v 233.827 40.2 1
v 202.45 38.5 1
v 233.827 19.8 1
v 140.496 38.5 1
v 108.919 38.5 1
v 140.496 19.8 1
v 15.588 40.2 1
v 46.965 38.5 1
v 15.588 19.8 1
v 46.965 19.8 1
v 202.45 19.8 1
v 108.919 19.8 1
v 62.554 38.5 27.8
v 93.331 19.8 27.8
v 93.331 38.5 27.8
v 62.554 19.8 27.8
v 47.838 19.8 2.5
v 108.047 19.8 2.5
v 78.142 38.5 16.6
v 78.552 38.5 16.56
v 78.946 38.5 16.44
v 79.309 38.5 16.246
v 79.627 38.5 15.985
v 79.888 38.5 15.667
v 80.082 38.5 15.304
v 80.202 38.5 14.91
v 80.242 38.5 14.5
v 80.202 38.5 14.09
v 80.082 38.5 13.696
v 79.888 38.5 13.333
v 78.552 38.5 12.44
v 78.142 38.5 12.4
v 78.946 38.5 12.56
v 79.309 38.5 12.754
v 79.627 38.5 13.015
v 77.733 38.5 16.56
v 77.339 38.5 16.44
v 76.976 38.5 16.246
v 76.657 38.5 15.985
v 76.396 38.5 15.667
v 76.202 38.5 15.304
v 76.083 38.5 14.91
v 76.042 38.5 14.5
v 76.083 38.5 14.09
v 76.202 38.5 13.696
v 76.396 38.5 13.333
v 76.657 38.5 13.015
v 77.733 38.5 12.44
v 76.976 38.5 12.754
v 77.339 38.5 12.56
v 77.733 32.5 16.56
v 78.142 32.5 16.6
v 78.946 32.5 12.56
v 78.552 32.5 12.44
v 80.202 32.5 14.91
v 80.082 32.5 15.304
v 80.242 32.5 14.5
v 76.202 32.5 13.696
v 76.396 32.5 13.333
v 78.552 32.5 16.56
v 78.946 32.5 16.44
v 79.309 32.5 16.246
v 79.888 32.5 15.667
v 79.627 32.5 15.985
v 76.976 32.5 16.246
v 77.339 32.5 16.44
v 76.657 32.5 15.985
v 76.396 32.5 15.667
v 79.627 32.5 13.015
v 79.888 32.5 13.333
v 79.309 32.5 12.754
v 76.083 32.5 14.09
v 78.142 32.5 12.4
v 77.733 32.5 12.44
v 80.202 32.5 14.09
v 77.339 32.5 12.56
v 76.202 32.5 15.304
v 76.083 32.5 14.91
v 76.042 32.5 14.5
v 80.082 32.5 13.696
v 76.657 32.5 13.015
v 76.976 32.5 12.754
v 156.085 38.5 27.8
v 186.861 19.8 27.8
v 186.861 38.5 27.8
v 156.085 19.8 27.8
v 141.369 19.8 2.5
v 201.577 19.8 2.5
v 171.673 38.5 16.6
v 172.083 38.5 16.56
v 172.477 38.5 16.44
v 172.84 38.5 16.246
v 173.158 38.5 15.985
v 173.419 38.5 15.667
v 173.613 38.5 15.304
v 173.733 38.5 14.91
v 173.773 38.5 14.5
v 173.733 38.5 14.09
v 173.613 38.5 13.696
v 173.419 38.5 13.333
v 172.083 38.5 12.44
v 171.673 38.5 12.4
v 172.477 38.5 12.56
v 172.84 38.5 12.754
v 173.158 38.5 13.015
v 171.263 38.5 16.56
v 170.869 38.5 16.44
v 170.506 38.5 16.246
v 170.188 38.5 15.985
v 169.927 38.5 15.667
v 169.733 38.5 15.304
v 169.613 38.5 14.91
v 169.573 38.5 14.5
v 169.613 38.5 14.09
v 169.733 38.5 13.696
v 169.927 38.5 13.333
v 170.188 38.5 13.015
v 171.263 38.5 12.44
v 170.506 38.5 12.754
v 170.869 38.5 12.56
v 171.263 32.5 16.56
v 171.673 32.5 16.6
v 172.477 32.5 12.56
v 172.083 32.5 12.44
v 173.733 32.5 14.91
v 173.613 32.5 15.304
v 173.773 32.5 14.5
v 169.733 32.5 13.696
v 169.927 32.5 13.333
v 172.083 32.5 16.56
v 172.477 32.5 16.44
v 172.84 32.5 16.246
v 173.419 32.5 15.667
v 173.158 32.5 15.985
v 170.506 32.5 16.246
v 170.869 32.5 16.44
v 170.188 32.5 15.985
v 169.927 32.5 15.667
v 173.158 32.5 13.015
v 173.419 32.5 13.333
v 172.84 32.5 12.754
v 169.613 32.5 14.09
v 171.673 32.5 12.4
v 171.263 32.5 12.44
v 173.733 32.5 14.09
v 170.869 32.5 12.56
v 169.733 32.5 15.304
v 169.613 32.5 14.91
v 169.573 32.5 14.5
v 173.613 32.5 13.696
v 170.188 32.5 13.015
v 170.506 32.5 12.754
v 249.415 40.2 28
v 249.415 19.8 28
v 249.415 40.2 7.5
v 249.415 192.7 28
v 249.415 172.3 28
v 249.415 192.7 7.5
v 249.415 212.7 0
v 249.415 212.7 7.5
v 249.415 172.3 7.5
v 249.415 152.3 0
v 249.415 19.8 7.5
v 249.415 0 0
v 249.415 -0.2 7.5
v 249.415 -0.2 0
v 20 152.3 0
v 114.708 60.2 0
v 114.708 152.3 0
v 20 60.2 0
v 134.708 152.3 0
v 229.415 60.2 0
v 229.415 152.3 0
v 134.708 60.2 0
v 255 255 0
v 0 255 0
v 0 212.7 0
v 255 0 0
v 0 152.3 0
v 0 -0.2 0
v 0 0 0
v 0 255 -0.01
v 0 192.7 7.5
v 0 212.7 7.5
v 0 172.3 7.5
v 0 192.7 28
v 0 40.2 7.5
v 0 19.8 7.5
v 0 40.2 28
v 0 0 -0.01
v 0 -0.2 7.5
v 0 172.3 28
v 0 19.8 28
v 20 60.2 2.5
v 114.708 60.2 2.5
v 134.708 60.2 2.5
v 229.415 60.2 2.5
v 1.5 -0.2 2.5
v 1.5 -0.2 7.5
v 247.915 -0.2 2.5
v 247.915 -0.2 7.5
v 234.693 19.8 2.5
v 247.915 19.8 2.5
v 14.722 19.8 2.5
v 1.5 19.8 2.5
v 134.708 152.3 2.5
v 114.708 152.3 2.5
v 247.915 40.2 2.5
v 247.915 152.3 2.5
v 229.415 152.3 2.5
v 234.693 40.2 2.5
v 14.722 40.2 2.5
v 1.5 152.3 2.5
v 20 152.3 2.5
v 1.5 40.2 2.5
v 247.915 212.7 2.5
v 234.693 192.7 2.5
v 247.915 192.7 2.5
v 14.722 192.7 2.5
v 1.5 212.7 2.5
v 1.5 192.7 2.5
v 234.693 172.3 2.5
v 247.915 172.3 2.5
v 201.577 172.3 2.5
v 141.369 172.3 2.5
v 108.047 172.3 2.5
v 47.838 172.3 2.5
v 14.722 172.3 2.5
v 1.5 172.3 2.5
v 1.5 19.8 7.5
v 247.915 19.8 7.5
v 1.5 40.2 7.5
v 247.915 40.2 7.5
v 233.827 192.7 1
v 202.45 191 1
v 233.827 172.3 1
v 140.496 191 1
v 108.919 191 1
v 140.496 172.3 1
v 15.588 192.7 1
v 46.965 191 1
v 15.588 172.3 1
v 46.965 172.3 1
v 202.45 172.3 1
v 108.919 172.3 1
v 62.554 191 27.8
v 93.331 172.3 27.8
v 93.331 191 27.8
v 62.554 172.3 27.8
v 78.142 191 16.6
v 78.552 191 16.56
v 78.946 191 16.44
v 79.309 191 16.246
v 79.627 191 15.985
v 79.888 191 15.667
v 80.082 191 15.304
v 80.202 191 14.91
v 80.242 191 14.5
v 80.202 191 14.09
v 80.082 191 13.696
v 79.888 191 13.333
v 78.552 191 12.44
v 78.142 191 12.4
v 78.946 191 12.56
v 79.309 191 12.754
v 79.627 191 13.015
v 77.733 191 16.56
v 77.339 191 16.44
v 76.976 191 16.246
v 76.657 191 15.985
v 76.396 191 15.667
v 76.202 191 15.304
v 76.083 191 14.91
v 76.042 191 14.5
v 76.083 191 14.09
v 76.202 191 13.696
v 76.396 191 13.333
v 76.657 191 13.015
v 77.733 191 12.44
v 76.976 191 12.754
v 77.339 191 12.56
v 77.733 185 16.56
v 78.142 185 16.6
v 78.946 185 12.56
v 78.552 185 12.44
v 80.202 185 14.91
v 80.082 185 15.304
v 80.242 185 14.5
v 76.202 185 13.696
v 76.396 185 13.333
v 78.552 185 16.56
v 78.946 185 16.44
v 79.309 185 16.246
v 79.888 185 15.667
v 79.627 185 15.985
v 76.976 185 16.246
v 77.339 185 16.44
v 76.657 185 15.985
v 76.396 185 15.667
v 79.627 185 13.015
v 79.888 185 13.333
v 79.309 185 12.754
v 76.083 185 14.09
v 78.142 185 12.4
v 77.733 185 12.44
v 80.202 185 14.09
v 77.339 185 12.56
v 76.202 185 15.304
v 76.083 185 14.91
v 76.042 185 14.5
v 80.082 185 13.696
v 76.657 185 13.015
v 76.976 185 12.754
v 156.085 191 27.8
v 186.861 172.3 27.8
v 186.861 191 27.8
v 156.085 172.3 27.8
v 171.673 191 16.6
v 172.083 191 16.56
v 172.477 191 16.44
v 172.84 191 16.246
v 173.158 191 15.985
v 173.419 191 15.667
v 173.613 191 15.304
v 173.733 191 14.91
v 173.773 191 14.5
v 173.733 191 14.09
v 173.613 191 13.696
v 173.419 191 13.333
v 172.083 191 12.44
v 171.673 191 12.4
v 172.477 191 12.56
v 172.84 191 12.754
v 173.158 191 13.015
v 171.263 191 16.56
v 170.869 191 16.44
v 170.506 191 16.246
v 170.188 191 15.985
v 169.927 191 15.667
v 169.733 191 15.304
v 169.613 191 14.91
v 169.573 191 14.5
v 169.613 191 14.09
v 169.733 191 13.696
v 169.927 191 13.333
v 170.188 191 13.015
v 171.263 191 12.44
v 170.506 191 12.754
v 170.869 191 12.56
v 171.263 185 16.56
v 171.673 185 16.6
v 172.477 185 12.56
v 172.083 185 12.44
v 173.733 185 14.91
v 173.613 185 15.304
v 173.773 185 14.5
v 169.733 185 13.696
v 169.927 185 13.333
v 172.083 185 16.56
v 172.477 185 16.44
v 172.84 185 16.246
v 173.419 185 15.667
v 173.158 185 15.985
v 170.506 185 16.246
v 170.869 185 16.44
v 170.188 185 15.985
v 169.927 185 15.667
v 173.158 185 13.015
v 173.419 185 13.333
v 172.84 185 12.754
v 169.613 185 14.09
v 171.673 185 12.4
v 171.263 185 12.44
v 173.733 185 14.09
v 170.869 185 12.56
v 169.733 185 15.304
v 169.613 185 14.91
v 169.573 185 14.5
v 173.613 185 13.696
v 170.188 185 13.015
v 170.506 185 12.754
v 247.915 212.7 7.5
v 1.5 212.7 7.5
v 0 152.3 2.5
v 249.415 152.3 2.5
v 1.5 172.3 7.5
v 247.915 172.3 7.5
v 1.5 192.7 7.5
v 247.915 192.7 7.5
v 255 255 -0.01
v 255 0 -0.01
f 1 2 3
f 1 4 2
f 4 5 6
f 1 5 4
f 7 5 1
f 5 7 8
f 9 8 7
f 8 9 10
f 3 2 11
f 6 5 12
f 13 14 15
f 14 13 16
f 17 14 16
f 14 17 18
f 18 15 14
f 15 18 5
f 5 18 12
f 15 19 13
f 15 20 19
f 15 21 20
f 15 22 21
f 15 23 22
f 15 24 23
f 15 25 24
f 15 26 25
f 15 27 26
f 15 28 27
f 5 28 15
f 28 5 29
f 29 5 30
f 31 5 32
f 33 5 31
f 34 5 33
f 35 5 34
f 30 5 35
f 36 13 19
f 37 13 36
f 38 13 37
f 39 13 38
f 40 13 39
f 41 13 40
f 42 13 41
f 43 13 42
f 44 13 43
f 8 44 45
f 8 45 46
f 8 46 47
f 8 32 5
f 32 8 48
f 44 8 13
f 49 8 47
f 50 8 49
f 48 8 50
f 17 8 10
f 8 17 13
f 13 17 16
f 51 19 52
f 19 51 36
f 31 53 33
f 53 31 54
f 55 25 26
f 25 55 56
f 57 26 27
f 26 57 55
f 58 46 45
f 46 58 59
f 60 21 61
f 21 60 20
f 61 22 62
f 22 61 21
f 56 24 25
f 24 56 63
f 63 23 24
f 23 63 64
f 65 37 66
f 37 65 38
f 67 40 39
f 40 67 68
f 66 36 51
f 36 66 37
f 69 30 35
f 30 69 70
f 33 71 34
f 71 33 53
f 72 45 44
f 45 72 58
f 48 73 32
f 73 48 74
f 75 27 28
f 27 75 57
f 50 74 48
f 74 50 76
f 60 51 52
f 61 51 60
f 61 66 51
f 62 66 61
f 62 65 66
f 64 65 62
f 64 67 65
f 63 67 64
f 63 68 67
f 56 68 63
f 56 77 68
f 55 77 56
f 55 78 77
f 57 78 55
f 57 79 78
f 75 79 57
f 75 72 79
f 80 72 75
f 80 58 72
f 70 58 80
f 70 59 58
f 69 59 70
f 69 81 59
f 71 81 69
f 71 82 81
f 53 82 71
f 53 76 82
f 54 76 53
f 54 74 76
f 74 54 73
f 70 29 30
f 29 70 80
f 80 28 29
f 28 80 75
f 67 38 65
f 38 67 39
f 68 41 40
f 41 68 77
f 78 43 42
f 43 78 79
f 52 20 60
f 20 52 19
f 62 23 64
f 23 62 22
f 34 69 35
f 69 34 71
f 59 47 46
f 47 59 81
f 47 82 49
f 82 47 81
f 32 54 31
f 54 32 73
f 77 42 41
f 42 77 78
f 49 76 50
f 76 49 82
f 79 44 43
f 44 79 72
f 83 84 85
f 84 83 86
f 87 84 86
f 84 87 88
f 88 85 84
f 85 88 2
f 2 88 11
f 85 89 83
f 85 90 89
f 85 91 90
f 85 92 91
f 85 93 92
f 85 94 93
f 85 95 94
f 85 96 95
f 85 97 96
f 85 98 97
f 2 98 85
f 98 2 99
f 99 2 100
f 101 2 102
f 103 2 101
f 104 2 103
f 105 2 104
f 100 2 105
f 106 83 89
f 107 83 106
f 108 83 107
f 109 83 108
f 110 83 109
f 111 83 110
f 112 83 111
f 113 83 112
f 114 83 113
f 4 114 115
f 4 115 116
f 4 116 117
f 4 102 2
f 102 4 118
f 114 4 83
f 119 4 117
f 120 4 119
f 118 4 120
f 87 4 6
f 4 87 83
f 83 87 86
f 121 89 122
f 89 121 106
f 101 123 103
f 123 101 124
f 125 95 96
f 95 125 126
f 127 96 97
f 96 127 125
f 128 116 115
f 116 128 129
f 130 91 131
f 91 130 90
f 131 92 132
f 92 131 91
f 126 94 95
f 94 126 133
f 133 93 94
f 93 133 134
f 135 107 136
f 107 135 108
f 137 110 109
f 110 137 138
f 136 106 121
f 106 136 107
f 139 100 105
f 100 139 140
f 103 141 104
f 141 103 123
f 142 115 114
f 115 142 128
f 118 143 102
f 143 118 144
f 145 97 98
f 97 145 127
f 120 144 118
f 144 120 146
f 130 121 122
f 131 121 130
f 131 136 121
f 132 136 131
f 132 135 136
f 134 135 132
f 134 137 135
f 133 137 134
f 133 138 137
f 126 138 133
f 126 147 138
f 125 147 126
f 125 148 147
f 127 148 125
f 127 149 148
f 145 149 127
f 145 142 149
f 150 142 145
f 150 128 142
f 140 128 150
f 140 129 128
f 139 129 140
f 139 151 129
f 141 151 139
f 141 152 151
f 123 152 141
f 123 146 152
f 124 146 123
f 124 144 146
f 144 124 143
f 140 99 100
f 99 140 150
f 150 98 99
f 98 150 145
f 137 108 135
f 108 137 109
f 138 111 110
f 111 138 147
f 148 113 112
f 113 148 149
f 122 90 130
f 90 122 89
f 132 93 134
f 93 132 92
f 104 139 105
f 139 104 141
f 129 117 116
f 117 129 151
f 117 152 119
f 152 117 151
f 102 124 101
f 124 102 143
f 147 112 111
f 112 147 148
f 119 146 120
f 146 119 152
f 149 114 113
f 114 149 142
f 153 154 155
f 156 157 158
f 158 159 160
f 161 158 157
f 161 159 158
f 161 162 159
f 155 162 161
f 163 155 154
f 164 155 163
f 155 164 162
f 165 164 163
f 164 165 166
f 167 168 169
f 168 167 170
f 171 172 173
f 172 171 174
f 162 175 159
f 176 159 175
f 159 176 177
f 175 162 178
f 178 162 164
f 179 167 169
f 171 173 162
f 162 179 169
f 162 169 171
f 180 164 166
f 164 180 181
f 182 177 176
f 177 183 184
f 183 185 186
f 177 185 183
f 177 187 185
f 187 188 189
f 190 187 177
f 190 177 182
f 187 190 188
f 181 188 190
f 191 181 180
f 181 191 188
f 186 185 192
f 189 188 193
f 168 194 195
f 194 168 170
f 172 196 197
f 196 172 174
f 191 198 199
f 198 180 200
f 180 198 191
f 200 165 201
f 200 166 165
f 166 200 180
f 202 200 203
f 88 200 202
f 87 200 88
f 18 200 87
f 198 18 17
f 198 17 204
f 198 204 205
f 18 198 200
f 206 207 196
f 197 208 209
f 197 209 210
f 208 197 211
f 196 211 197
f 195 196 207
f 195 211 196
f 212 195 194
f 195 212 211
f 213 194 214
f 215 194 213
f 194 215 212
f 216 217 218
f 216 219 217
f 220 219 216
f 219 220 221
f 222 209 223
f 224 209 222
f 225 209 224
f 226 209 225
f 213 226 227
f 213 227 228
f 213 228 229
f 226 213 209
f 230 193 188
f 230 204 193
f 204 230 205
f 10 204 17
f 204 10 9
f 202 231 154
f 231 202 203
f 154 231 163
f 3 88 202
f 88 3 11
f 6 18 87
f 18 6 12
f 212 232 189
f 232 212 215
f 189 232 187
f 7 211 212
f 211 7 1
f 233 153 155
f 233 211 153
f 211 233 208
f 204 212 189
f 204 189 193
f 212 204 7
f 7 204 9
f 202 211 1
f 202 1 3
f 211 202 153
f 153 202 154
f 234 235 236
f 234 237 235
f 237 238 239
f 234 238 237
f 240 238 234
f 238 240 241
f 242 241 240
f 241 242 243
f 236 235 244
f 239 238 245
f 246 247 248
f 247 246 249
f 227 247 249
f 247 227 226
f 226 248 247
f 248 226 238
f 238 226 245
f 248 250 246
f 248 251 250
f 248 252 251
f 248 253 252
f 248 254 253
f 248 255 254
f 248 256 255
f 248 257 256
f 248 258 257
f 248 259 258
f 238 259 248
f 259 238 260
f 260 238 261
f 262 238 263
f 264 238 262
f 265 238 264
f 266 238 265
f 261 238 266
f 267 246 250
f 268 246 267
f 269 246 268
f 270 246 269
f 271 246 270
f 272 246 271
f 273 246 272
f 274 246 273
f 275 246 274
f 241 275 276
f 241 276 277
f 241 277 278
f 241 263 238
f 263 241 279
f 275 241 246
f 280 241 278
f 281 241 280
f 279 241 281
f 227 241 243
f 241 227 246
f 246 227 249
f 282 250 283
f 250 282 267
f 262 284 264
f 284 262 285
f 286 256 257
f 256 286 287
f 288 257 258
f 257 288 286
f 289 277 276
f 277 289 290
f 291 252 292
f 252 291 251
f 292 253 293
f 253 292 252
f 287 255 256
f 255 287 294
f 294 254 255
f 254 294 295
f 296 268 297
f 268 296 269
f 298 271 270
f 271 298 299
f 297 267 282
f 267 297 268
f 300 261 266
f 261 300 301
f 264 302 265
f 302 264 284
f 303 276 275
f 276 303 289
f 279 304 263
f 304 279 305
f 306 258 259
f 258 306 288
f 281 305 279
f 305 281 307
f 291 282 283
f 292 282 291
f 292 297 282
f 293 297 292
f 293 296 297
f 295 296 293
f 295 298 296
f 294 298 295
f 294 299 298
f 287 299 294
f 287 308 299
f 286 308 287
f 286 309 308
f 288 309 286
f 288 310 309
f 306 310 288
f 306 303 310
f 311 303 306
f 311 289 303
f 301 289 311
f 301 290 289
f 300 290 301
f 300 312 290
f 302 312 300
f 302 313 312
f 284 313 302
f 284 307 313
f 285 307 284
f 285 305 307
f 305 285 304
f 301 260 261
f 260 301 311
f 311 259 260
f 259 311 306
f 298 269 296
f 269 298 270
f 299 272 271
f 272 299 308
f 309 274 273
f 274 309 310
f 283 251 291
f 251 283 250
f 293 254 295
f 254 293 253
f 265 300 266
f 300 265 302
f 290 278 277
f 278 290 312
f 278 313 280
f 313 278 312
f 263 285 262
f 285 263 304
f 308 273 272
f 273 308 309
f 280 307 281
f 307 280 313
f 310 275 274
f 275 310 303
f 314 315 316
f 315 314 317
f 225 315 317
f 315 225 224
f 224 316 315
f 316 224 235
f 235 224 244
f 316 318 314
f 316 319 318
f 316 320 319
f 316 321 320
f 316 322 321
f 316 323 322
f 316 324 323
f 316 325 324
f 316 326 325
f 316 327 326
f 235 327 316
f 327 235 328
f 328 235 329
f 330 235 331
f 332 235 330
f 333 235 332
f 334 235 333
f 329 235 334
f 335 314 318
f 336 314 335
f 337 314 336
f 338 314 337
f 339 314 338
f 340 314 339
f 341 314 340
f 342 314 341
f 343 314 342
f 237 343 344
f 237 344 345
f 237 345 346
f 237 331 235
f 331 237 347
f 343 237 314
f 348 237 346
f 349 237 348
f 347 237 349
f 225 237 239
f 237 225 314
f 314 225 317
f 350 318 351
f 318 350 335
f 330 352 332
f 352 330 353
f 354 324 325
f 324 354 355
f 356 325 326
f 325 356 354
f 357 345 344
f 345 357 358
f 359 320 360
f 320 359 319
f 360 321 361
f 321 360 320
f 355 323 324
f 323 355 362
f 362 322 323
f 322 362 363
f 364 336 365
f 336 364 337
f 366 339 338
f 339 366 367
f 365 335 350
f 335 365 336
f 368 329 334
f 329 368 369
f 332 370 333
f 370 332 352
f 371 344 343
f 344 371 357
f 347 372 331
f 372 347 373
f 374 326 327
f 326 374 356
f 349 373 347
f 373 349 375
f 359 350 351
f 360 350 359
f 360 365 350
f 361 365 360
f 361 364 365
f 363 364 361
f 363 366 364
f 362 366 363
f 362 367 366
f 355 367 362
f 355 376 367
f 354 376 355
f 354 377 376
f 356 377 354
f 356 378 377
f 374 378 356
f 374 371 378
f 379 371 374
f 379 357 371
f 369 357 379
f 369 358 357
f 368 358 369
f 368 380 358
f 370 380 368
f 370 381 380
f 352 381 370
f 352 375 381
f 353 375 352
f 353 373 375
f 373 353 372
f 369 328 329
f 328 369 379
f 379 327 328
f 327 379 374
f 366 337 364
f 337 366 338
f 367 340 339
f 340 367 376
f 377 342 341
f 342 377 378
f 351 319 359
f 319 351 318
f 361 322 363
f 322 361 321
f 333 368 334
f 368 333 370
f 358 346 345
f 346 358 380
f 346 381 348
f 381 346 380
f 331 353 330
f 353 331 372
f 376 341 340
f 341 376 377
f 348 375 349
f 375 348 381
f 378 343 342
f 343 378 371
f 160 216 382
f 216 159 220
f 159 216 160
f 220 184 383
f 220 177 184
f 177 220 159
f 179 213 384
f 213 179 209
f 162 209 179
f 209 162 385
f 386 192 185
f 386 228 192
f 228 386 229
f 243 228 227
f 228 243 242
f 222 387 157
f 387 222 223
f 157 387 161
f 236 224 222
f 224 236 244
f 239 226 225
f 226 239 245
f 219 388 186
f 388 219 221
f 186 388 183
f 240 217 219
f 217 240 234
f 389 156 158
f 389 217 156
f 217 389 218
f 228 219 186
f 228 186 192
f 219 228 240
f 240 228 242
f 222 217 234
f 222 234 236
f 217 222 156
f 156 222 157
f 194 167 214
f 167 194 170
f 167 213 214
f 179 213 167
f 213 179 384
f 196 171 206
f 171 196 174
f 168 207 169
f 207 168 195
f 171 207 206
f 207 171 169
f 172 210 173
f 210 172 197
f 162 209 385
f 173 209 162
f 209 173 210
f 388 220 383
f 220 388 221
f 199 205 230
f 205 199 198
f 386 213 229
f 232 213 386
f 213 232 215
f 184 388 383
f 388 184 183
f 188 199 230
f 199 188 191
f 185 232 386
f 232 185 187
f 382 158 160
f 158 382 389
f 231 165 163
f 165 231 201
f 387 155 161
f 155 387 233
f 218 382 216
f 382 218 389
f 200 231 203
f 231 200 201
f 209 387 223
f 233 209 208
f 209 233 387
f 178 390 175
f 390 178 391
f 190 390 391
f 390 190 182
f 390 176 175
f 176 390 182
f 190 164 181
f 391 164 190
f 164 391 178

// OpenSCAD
// file: modules/screw-connectors.scad
////////////////////////////////////////////////////////////////////////////////////////////////////////////////////////

SCREW_CLEARANCE = 0.15;

// [ shaft diameter, head diameter, shaft length, head height ]

SCREW_SHAFT_DIAMETER = 0;
SCREW_HEAD_DIAMETER = 1;
SCREW_SHAFT_LENGTH = 2;
SCREW_HEAD_HEIGHT = 3;

M3x8 = [ 2.9, 5.5, 8, 3.0 ];
M3x16 = [ 2.9, 5.5, 16, 3.0 ];

// [ inner diameter, outer diameter, length ]
INSERT_SCREW_DIAMETER = 0;
INSERT_OUTER_DIAMETER = 1;
INSERT_LENGTH = 2;

M3x6_INSERT = [ 2.4, 4.2, 6.0 ];

WASHER_INNER_DIAMETER = 0;
WASHER_OUTER_DIAMETER = 1;
WASHER_HEIGHT = 2;

M3_WASHER = [ 3.0, 7.0, 0.5 ];

////////////////////////////////////////////////////////////////////////////////////////////////////////////////////////

module ScrewShaft( screw_def, include_clearance = true )
{
    cylinder(
        h = screw_def[ SCREW_SHAFT_LENGTH ],
        r = screw_def[ SCREW_SHAFT_DIAMETER ] / 2 + ( include_clearance ? SCREW_CLEARANCE : 0 ),
        $fn = 32 );
}

////////////////////////////////////////////////////////////////////////////////////////////////////////////////////////

module HeatedInsert( insert_def )
{
    cylinder(
        h = insert_def[ INSERT_LENGTH ],
        r = insert_def[ INSERT_OUTER_DIAMETER ] / 2,
        $fn = 32 );
}

////////////////////////////////////////////////////////////////////////////////////////////////////////////////////////

module PreviewScrew( screw_def, washer_def = [] )
{
    % cylinder(
        h = screw_def[ SCREW_SHAFT_LENGTH ],
        r = screw_def[ SCREW_SHAFT_DIAMETER ] / 2,
        $fn = 32 );

    % translate([ 0, 0, screw_def[ SCREW_SHAFT_LENGTH ] ])
        cylinder(
            h = screw_def[ SCREW_HEAD_HEIGHT ],
            r = screw_def[ SCREW_HEAD_DIAMETER ] / 2,
            $fn = 32 );

    if( len( washer_def ) > 0 )
    {
        % translate([ 0, 0, screw_def[ SCREW_SHAFT_LENGTH ] - washer_def[ WASHER_HEIGHT ] ])
            cylinder(
                h = washer_def[ WASHER_HEIGHT ],
                r = washer_def[ WASHER_OUTER_DIAMETER ] / 2,
                $fn = 32 );
    }
}

////////////////////////////////////////////////////////////////////////////////////////////////////////////////////////

module PreviewHeatedInsert( insert_def )
{
    % render()
    {
        difference()
        {
            cylinder(
                h = insert_def[ INSERT_LENGTH ],
                r = insert_def[ INSERT_OUTER_DIAMETER ] / 2,
                $fn = 32 );

            cylinder(
                h = insert_def[ INSERT_LENGTH ],
                r = insert_def[ INSERT_SCREW_DIAMETER ] / 2,
                $fn = 32 );
        }
    }
}

////////////////////////////////////////////////////////////////////////////////////////////////////////////////////////
// file: modules/trapezoidal-prism.scad
////////////////////////////////////////////////////////////////////////////////////////////////////////////////////////

module TrapezoidalPrism( x_top, x_bottom, y, z, center = true )
{
    translate( center ? [ 0, 0, -z ] : [ x_bottom / 2, y / 2, 0 ] )
        polyhedron(
            points = [
                [ -x_bottom / 2, -y / 2, 0 ],  // 0: bottom back left
                [ x_bottom / 2, -y / 2, 0 ],   // 1: bottom back right
                [ x_bottom / 2, y / 2, 0 ],    // 2: bottom front right
                [ -x_bottom / 2, y / 2, 0 ],   // 3: bottom front left
                
                [ -x_top / 2, -y / 2, z ],  // 4: top back left
                [ x_top / 2, -y / 2, z ],   // 5: top back right
                [ x_top / 2, y / 2, z ],    // 6: top front right
                [ -x_top / 2, y / 2, z ]    // 7: top front left
            ],
            faces = [
                [ 0, 3, 2, 1 ], // bottom
                [ 4, 5, 6, 7 ], // top

                [ 0, 1, 5, 4 ],  // back
                [ 1, 2, 6, 5 ],  // right
                [ 2, 3, 7, 6 ],  // front
                [ 3, 0, 4, 7 ]   // left
            ]);
}

////////////////////////////////////////////////////////////////////////////////////////////////////////////////////////
// file: modules/triangular-prism.scad
////////////////////////////////////////////////////////////////////////////////////////////////////////////////////////

module TriangularPrism( x, y, z )
{
    polyhedron(
        points = [
            [ 0, 0, z ],
            [ x, 0, z ],
            [ x, 0, 0 ],
            [ 0, 0, 0 ],
            [ 0, y, 0 ],
            [ x, y, 0 ]
            ],
        faces = [
            [ 0, 1, 2, 3 ],
            [ 1, 5, 2 ],
            [ 0, 4, 5, 1 ],
            [ 2, 5, 4, 3 ],
            [ 0, 3, 4 ]
            ]
        );
}

////////////////////////////////////////////////////////////////////////////////////////////////////////////////////////
// main file
use <MCAD/regular_shapes.scad>

use <modules/triangular-prism.scad>
use <modules/trapezoidal-prism.scad>
include <modules/screw-connectors.scad>

////////////////////////////////////////////////////////////////////////////////////////////////////////////////////////
// measurements

roll_length = 305.0;

small_roll_radius = 46.0 / 2;

large_roll_radius = 76.5 / 2;

roll_clearance = 2.5;

cube_shelf_size = 281;

holder_ring_depth = 20;
holder_ring_thickness = 1.5;

holder_base_clearance = 0.2;
holder_base_side_width = 20;

holder_base_spacing_y = roll_length * 0.50;
holder_base_vertical_support_z = 5;
holder_base_floor_z = 1.0;

preview_thickness = 0.01;

build_volume_size = 255;

////////////////////////////////////////////////////////////////////////////////////////////////////////////////////////
// settings

// small rolls
roll_radius = small_roll_radius;
num_rows = 7;

// large rolls
// roll_radius = large_roll_radius;
// num_rows = 3;

// only choose one
render_mode = "simple-preview";
// render_mode = "full-preview";
// render_mode = "render-holder";
// render_mode = "render-base";

////////////////////////////////////////////////////////////////////////////////////////////////////////////////////////
// calculations

r = roll_radius + roll_clearance + holder_ring_thickness;
R = CalculateFaceSideLength( roll_radius );
a = r * 2 / sqrt( 3 );

max_rolls_even = 1 + floor( ( build_volume_size - R * 2 ) / ( R * 2 + a ) );
max_rolls_odd = floor( ( build_volume_size - CalculateXOffset( roll_radius, 1, 0 ) ) / ( R * 2 + a ) );

////////////////////////////////////////////////////////////////////////////////////////////////////////////////////////
// models

if( render_mode == "simple-preview" )
{
    PrinterBuildPlatePreview();

    translate([ 0, holder_base_side_width + holder_ring_depth, 0 ])
        rotate([ 90, 0, 0 ])
            VinylRollHolder( roll_radius, build_volume_size, num_rows );

    translate([ 0, holder_base_side_width, holder_base_floor_z ])
        VinylRollHolderBase( roll_radius, build_volume_size, holder_base_spacing_y );
}

if( render_mode == "full-preview" )
{
    CubeShelfPreview();

    translate([ 0, holder_base_side_width + holder_ring_depth, 0 ])
        rotate([ 90, 0, 0 ])
            VinylRollHolder( roll_radius, build_volume_size, num_rows );

    translate([ 0, holder_base_side_width, holder_base_floor_z ])
        VinylRollHolderBase( roll_radius, build_volume_size, holder_base_spacing_y );
}

if( render_mode == "render-holder" )
{
    VinylRollHolder( roll_radius, build_volume_size, num_rows );
}

if( render_mode == "render-base" )
{
    translate([ 0, holder_base_side_width, holder_base_floor_z ])
        VinylRollHolderBase( roll_radius, build_volume_size, holder_base_spacing_y );
}

////////////////////////////////////////////////////////////////////////////////////////////////////////////////////////

// formulas: https://www.gigacalculator.com/calculators/hexagon-calculator.php

// calculates the hexagon 'a'
function CalculateHexagonSideLength( r ) = r * 2 / sqrt( 3 );

// calculates the hexagon 'R'
function CalculateFaceSideLength( roll_radius ) = CalculateHexagonSideLength( roll_radius + roll_clearance + holder_ring_thickness );

// calculates the x-offset for the row starting on row_num
function CalculateXOffset( roll_radius, is_even_row, i ) = R + 3 * R * i + ( is_even_row ? 0 : R + R * cos( 60 ) );

// calculates the y-offset for the row at row_num
function CalculateYOffset( roll_radius, row_num ) = r + row_num * r;

////////////////////////////////////////////////////////////////////////////////////////////////////////////////////////

module VinylRollHolder( roll_radius, max_width, num_rows )
{
    assert( num_rows % 2 == 1, "Must be an odd number!" );

    for( i = [ 0 : num_rows - 1 ] )
    {
        translate([ 0, CalculateYOffset( roll_radius, i ), 0 ])
            _VinylRollHolderRow(
                roll_radius = roll_radius,
                num_hexagons = i % 2 == 0 ? max_rolls_even : max_rolls_odd,
                is_even_row = i % 2 == 0,
                i == 0,
                i == num_rows - 1 );
    }
}

////////////////////////////////////////////////////////////////////////////////////////////////////////////////////////

module VinylRollHolderBase( roll_radius, max_width, y_offset )
{
    assert( max_width > R * 2, "Less than one hexagon?!" );

    base_x = max_rolls_even * R * 2 + max_rolls_odd * R;

    // front
    _VinylRollHolderBase( roll_radius, max_width );

    // rear
    translate([ 0, y_offset, 0 ])
        _VinylRollHolderBase( roll_radius, max_width );

    // left horizontal connector
    translate([ 0, holder_ring_depth + holder_base_clearance + holder_base_side_width, -holder_base_floor_z ])
      cube([ holder_base_side_width, y_offset - holder_base_side_width * 2 - holder_base_clearance * 2 - holder_ring_depth, holder_ring_thickness + holder_base_floor_z ]);

    // center horizontal connector
    translate([ ( base_x - holder_base_side_width ) / 2, holder_ring_depth + holder_base_clearance + holder_base_side_width, -holder_base_floor_z ])
      cube([ holder_base_side_width, y_offset - holder_base_side_width * 2 - holder_base_clearance * 2 - holder_ring_depth, holder_ring_thickness + holder_base_floor_z ]);

    // right horizontal connector
    translate([ base_x - holder_base_side_width, holder_ring_depth + holder_base_clearance + holder_base_side_width, -holder_base_floor_z ])
      cube([ holder_base_side_width, y_offset - holder_base_side_width * 2 - holder_base_clearance * 2 - holder_ring_depth, holder_ring_thickness + holder_base_floor_z ]);

    // left vertical support
    translate([ 0, -holder_base_side_width - holder_base_clearance, holder_ring_thickness ])
        cube([ holder_ring_thickness, holder_base_side_width * 2 + holder_base_clearance * 2 + holder_ring_depth + y_offset, holder_base_vertical_support_z ]);

    // right vertical support
    translate([ base_x - holder_ring_thickness, -holder_base_side_width - holder_base_clearance, holder_ring_thickness ])
        cube([ holder_ring_thickness, holder_base_side_width * 2 + holder_base_clearance * 2 + holder_ring_depth + y_offset, holder_base_vertical_support_z ]);
}

////////////////////////////////////////////////////////////////////////////////////////////////////////////////////////

module _VinylRollHolderBase( roll_radius, max_width, insert_on_front )
{
    outer_hexagon_side_length = R;

    base_x = max_rolls_even * R * 2 + max_rolls_odd * R;

    // floor
    translate([ 0, -holder_ring_depth - holder_base_clearance, -holder_base_floor_z ])
        cube([ base_x, holder_base_side_width * 2 + holder_ring_depth + holder_base_clearance * 2, holder_base_floor_z ]);

    // flat edge - front
    translate([ 0, -holder_ring_depth - holder_base_clearance, 0 ])
        cube([ base_x, holder_base_side_width, holder_ring_thickness ]);

    // flat edge - back
    translate([ 0, holder_ring_depth + holder_base_clearance , 0 ])
        cube([ base_x, holder_base_side_width, holder_ring_thickness ]);

    end_cap_x = R * cos( 60 );
    end_cap_y = r;
    
    // before first hexagon
    translate([ 0, holder_base_side_width + holder_base_clearance, 0 ])
        rotate([ 0, 0, -90 ])
            TriangularPrism( holder_base_side_width + holder_base_clearance * 2, end_cap_x, r );

    // after last hexagon
    translate([ base_x, -holder_base_clearance, 0 ])
        rotate([ 0, 0, 90 ])
            TriangularPrism( holder_base_side_width + holder_base_clearance * 2, end_cap_x, r );

    // in between middle hexagons
    for( i = [ 0 : max_rolls_odd - 1 ] )
    {
        translate([ CalculateXOffset( roll_radius, true, i ) + R / 2 + holder_base_clearance, -holder_base_clearance, 0 ])
        {
            render()
            {
                difference()
                {
                    TrapezoidalPrism(
                        x_top = R - holder_base_clearance * 2,
                        x_bottom = R * 2 - holder_base_clearance * 2,
                        y = holder_ring_depth + holder_base_clearance - holder_ring_thickness,
                        z = r - holder_base_clearance,
                        center = false );

                    translate([ R, holder_ring_depth - holder_ring_thickness + holder_base_clearance, r / 2 ])
                        rotate([ 90, 0, 0 ])
                            HeatedInsert( M3x6_INSERT );
                }
            }
        }
    }
}

////////////////////////////////////////////////////////////////////////////////////////////////////////////////////////

module _VinylRollHolderRow( roll_radius, num_hexagons, is_even_row, add_screw_supports_bottom, add_screw_supports_top )
{
    for( i = [ 0 : num_hexagons - 1 ] )
    {
        translate([ CalculateXOffset( roll_radius, is_even_row, i ), 0, 0 ])
            _VinylRollHolderHexagon( roll_radius );

        if( add_screw_supports_bottom && i > 0 )
        {
            translate([ CalculateXOffset( roll_radius, true, i - 1 ) + R / 2, -r, holder_ring_thickness ])
                rotate([ -90, 0, 0 ])
                    _VinylRollHolderRowScrewSupport( roll_radius );
        }

        if( add_screw_supports_top && i > 0 )
        {
            translate([ CalculateXOffset( roll_radius, true, i - 1 ) + R / 2, r, 0 ])
                rotate([ 90, 0, 0 ])
                    _VinylRollHolderRowScrewSupport( roll_radius );
        }
    }
}

////////////////////////////////////////////////////////////////////////////////////////////////////////////////////////

module _VinylRollHolderRowScrewSupport( roll_radius )
{
    render()
    {
        difference()
        {
            TrapezoidalPrism(
                x_top = R,
                x_bottom = R * 2,
                y = holder_ring_thickness,
                z = r,
                center = false );

            translate([ R, holder_ring_thickness + 2, r / 2 ]) // TODO: fix... 2???
                rotate([ 90, 0, 0 ])
                    ScrewShaft( M3x8 );
        }
    }
}

////////////////////////////////////////////////////////////////////////////////////////////////////////////////////////

module _VinylRollHolderHexagon( roll_radius )
{
    outer_radius = CalculateFaceSideLength( roll_radius );
    inner_radius = CalculateFaceSideLength( roll_radius - holder_ring_thickness );

    if( render_mode == "full-preview" )
    {
        % translate([ 0, 0, -roll_length + holder_base_side_width + holder_ring_depth ])
            cylinder( h = roll_length, r = roll_radius, $fn = 48 );
    }

    render()
    {
        difference()
        {
            // outer
            hexagon_prism( radius = outer_radius, height = holder_ring_depth );

            // inner
            hexagon_prism( radius = inner_radius, height = holder_ring_depth );
        }
    }
}

////////////////////////////////////////////////////////////////////////////////////////////////////////////////////////

module CubeShelfPreview()
{
    // bottom
    % translate([ 0, 0, -preview_thickness ])
        cube([ cube_shelf_size, cube_shelf_size, preview_thickness ]);

    // right
    % translate([ cube_shelf_size, 0, 0 ])
        cube([ preview_thickness, cube_shelf_size, cube_shelf_size ]);

    // top
    % translate([ 0, 0, cube_shelf_size ])
        cube([ cube_shelf_size, cube_shelf_size, preview_thickness ]);

    // left
    % translate([ -preview_thickness, 0, 0 ])
        cube([ preview_thickness, cube_shelf_size, cube_shelf_size ]);
}

////////////////////////////////////////////////////////////////////////////////////////////////////////////////////////

module PrinterBuildVolumePreview()
{
    // bottom
    # translate([ 0, 0, -preview_thickness ])
        cube([ build_volume_size, build_volume_size, preview_thickness ]);

    // right
    # translate([ build_volume_size, 0, 0 ])
        cube([ preview_thickness, build_volume_size, build_volume_size ]);

    // top
    # translate([ 0, 0, build_volume_size ])
        cube([ build_volume_size, build_volume_size, preview_thickness ]);

    // left
    # translate([ -preview_thickness, 0, 0 ])
        cube([ preview_thickness, build_volume_size, build_volume_size ]);
}

////////////////////////////////////////////////////////////////////////////////////////////////////////////////////////

module PrinterBuildPlatePreview()
{
    # translate([ 0, 0, -preview_thickness ])
        cube([ build_volume_size, build_volume_size, preview_thickness ]);
}

////////////////////////////////////////////////////////////////////////////////////////////////////////////////////////

module VinylRollPreview( r )
{
    % rotate([ -90, 0, 0 ])
        cylinder( h = roll_length, r = r );
}

////////////////////////////////////////////////////////////////////////////////////////////////////////////////////////
